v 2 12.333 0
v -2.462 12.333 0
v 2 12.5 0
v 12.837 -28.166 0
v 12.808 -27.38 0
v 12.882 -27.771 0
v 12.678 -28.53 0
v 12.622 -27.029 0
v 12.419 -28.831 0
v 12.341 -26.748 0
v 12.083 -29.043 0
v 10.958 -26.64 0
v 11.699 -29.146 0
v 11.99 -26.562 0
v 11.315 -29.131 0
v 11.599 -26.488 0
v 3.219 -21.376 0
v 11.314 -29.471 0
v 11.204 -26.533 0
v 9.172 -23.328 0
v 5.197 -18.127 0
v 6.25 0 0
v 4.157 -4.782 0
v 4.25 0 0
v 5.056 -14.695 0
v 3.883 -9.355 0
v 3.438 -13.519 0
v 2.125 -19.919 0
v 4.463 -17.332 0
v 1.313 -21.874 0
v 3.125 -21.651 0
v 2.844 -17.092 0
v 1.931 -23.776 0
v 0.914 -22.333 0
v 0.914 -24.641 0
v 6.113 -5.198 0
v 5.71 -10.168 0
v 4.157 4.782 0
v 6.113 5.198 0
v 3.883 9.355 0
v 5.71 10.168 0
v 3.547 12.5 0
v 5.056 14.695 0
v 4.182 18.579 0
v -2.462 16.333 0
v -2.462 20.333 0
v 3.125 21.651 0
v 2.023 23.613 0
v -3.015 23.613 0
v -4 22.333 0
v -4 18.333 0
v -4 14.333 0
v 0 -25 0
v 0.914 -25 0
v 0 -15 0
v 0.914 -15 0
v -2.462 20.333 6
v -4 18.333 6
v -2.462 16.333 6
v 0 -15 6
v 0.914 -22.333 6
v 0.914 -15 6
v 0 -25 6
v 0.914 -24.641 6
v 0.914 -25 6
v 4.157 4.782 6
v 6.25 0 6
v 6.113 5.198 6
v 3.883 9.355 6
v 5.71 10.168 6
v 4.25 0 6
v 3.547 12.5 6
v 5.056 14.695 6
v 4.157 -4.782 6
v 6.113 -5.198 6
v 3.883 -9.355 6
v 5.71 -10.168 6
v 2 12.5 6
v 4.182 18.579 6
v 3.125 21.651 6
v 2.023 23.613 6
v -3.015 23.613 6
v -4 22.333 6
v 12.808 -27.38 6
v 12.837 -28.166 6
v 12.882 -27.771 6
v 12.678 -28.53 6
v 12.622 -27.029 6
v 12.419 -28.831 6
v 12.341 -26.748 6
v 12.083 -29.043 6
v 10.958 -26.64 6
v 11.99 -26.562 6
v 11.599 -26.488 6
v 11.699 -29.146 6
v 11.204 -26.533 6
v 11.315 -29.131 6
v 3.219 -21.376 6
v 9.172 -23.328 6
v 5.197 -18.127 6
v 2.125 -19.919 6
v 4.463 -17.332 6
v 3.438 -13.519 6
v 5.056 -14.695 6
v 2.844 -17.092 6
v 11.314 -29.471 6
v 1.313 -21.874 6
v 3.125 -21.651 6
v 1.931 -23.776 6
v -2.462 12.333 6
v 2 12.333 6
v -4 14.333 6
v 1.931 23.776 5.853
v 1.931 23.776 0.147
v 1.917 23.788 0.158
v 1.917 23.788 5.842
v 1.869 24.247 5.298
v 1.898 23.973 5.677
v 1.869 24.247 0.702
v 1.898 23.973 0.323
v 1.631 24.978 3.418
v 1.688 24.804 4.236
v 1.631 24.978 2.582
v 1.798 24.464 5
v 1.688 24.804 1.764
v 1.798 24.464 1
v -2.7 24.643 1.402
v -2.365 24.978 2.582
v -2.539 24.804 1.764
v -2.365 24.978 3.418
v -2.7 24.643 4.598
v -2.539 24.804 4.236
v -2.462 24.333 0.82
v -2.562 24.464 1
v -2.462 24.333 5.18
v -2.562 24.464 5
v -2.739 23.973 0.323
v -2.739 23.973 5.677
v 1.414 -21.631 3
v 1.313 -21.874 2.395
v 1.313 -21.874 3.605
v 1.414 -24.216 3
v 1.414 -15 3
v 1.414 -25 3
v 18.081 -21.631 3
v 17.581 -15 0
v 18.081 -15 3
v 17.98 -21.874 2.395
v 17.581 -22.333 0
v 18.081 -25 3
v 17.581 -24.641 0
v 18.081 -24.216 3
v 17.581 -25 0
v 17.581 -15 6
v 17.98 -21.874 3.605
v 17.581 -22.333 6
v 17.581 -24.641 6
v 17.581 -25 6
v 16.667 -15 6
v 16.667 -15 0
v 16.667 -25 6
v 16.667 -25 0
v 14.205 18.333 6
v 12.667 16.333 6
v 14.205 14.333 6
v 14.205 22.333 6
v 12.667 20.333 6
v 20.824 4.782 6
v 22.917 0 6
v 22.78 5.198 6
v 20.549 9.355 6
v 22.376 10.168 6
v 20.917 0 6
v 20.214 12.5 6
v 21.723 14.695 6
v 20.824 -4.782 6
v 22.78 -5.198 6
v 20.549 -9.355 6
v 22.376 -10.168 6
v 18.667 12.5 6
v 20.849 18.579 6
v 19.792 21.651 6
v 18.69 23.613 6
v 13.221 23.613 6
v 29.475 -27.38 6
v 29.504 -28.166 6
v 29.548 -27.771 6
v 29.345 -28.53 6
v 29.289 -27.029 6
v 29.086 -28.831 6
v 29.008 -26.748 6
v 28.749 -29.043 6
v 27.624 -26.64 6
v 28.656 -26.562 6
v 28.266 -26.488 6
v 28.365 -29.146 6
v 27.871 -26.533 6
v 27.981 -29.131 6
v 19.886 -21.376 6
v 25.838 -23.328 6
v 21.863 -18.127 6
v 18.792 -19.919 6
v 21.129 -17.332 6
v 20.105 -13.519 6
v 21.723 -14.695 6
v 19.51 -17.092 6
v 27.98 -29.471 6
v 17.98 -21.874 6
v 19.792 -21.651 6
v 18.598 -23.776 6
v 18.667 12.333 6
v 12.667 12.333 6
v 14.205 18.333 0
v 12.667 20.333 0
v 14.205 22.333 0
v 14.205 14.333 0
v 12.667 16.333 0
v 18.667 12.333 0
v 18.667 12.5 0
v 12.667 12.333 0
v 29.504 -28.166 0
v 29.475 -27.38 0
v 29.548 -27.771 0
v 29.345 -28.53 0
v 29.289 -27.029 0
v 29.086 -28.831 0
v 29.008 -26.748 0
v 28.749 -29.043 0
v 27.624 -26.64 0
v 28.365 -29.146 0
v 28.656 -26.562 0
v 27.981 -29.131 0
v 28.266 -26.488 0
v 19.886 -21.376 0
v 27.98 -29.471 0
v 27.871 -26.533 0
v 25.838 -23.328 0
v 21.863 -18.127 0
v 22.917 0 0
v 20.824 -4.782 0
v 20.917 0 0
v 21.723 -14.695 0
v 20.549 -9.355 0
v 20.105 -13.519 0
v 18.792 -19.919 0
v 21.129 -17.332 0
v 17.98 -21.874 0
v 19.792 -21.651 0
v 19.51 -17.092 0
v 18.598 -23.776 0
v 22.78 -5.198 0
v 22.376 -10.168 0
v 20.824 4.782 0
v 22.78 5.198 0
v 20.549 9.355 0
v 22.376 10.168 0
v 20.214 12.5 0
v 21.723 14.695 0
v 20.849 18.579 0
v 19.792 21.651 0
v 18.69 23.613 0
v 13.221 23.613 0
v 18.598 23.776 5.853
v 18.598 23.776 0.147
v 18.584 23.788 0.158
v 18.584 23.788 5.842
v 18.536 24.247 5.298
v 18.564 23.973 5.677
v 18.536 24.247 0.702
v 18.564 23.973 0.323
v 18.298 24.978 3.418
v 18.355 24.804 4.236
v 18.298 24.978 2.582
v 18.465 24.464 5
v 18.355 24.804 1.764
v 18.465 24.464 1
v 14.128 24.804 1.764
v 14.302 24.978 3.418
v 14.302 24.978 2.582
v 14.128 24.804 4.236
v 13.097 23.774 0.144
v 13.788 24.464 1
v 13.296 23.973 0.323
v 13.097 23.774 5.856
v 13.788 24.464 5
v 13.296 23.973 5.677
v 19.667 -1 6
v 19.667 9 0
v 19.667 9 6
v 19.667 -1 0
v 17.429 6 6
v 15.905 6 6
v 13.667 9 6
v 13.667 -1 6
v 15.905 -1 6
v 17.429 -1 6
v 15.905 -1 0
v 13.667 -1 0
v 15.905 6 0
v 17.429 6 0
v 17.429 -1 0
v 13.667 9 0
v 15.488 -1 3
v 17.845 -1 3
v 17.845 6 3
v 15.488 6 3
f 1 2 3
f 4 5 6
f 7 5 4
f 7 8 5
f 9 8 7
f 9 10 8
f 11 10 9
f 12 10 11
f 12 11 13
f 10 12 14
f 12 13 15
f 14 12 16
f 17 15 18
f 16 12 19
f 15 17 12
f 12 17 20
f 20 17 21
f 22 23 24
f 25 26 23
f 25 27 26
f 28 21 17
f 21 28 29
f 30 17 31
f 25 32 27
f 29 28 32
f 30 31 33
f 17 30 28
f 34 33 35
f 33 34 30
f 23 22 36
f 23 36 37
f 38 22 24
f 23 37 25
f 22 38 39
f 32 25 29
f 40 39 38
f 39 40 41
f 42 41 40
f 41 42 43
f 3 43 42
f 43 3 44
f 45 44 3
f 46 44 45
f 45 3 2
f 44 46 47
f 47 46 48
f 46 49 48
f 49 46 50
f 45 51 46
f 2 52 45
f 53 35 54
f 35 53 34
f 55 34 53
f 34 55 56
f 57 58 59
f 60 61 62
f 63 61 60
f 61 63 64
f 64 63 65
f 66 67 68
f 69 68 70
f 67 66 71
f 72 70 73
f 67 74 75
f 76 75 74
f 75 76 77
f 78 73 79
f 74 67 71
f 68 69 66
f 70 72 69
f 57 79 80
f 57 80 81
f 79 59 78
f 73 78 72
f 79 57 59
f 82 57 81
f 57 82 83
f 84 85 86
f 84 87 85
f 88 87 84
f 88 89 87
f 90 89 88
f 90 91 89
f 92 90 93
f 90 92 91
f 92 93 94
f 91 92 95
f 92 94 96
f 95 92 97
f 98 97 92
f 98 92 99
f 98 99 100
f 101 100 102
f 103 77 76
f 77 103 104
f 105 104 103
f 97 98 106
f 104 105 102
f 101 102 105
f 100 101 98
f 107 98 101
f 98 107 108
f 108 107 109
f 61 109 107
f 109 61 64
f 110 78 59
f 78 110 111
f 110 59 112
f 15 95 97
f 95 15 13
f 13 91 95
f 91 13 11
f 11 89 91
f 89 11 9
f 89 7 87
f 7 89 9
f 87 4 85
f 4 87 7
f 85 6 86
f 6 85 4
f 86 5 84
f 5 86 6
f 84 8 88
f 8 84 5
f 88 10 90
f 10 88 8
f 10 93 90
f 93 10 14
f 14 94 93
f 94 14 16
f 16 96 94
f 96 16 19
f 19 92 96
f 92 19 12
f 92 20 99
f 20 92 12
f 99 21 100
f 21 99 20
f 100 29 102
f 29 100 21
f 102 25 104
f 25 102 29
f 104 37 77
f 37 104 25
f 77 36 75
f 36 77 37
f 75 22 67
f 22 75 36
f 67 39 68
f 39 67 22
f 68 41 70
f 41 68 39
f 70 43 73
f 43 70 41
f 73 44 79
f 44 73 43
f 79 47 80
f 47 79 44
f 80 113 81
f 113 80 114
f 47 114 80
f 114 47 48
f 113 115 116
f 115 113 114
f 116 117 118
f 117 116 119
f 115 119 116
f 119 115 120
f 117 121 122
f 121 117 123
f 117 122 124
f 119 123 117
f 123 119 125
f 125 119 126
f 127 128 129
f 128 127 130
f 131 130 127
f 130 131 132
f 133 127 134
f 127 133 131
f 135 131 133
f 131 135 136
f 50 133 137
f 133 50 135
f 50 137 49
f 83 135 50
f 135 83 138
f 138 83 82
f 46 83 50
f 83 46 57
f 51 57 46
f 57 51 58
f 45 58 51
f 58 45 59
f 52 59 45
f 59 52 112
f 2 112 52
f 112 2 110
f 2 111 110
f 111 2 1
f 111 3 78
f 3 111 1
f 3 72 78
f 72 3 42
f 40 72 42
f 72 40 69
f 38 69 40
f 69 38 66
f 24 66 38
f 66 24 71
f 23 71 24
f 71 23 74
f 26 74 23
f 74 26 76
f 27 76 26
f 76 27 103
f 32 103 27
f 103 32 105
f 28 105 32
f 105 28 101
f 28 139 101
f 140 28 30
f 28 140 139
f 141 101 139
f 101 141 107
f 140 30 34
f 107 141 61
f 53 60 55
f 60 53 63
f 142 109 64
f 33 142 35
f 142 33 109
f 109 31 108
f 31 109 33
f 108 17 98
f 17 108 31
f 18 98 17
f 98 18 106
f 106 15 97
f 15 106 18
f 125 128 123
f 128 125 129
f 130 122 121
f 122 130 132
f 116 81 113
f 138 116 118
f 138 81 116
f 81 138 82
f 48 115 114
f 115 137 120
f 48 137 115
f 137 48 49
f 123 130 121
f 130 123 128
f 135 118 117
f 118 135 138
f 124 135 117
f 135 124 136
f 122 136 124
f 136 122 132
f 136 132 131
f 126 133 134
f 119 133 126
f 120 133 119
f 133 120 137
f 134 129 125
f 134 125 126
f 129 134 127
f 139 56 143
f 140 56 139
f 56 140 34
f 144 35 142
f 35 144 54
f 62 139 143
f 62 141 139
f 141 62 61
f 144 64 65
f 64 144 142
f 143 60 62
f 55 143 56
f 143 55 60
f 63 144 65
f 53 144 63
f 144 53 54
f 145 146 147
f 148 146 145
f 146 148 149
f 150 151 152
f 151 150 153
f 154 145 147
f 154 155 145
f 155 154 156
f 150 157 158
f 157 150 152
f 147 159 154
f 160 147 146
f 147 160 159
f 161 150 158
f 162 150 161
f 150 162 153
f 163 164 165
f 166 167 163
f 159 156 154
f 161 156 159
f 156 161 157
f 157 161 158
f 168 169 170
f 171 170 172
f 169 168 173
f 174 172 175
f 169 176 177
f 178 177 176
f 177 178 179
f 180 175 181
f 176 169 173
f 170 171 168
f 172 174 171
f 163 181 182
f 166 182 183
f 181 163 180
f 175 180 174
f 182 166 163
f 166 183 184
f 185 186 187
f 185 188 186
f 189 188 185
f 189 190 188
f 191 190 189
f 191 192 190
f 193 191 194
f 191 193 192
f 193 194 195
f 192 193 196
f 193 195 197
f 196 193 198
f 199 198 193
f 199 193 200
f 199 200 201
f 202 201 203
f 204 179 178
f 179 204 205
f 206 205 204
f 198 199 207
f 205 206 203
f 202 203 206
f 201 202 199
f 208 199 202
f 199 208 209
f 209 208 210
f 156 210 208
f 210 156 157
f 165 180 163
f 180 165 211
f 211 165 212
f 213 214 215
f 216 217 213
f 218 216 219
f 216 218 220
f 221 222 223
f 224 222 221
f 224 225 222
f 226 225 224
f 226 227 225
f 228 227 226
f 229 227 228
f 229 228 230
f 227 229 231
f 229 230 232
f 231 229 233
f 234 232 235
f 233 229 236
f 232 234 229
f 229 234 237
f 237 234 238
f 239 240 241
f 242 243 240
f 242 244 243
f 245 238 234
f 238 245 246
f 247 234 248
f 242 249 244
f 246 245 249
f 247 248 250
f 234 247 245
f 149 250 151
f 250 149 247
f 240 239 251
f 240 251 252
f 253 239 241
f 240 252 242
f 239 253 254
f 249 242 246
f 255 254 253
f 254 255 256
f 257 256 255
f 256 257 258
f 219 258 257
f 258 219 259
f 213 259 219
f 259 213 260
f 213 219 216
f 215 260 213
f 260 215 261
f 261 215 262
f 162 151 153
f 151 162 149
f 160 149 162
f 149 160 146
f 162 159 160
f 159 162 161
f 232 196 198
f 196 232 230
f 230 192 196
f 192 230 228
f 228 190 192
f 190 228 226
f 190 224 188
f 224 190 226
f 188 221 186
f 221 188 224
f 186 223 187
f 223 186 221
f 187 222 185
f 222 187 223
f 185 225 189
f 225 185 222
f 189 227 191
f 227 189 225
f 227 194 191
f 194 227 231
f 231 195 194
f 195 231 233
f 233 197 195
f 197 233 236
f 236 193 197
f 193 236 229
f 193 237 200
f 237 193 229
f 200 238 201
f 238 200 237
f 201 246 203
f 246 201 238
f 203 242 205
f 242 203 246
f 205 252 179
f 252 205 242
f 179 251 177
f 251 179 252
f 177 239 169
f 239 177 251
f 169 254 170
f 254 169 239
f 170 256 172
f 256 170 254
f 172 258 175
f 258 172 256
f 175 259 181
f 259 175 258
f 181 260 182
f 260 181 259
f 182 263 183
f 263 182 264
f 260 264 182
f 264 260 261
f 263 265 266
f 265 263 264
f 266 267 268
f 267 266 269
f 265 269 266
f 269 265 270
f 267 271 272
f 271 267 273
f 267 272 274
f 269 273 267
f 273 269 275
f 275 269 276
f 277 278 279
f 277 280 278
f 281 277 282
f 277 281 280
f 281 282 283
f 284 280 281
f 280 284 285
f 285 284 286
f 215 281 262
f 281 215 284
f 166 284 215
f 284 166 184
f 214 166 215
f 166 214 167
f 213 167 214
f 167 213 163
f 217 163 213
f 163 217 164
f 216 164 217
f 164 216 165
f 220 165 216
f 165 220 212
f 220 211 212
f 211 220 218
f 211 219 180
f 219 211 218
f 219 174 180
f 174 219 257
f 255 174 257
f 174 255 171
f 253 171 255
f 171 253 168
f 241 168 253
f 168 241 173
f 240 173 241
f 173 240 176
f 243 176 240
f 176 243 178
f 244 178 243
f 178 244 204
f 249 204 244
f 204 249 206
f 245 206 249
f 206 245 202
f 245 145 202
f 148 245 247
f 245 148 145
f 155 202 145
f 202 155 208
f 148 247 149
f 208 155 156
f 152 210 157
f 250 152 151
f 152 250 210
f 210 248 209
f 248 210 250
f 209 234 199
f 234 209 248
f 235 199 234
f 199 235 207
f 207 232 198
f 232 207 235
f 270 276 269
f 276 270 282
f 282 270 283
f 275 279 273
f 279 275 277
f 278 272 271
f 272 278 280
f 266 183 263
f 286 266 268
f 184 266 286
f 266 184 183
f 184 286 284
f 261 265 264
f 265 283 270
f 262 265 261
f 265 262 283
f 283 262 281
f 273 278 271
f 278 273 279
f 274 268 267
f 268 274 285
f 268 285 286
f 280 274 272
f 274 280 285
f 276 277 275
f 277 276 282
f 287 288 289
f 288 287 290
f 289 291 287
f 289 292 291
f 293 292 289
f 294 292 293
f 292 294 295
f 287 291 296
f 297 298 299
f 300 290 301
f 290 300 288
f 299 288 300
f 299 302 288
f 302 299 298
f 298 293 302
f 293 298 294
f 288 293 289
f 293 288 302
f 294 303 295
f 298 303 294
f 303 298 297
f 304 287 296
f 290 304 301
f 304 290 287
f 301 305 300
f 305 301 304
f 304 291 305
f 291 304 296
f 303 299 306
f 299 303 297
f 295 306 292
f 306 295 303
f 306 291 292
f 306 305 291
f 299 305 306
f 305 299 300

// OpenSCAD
//
//  Copyright (C) 15-05-2013 Jasper den Ouden.
//
//  This is free software: you can redistribute it and/or modify
//  it under the terms of the GNU General Public License as published
//  by the Free Software Foundation, either version 3 of the License, or
//  (at your option) any later version.
//

// Clamp profile and application with 5mm pole system.

$quality=30;//120;
$fs=0.4;

t=4; //Thicknesses.
l= 50; //Length of clamp.
h = 1.5*t;

zl = t; //Single zigzag length.
zw = zl/1.3;

tab=true;
logo=true;

hl = 20; //Handle length.
ha = 45; //.. angle
ht = t;  //.. thickness

module teeth_profile(oz,l=l)
{   difference()
    {   union()
        {   square([1.5*t,l-1.5*t]);
            intersection() 
            {   translate([0,l-1.5*t]) circle(1.5*t);
                square([1.5*t,l]);
            }
        }
        //Zigzag motion.
        for( y = [oz : zl : l] ) 
            translate([0,y]) scale([zw/zl,1]) rotate(45) square([zl,zl]/sqrt(2), center=true);
        //Entry at top.
        translate([0,l]) rotate(45) square(t*[2,2], center=true);
    }
}

module clamp_profile(oz)
{   union()
    {   difference()
        {   union()
            {   scale([1/2,2]/4) circle(l); //Arc.
                if( hl > 0 ) translate([0,-l/4]) rotate(180+ha) union()//Handle
                {   intersection() 
                    {   square([ht,hl]);
                        translate([ht,0]) scale([ht,hl]) circle(1);
                    }
                    translate([2*ht/3,hl-ht/4]) circle(ht/3);
                }
            }
            difference()
            {   scale([1/2-2*t/l,2-2*t/l]/4) circle(l); //Hole and reinforcement.
                translate([5*l,l/2]) square([10*l,l/2],center=true);
            }
            translate([-l,-l]) square([l,2*l]); //Half it.
        }
        //Pad.
        translate([-t,t+l/6]) 
            intersection(){ teeth_profile(oz,l/3); square([l,l/3-t],r=t/3); }
    }
}

peg_connect = false; //Old way of connecting the two parts.
module peg_profile()
{   polygon([[+1,-1],[-1,+1],[+1,+1]]*t/2); }

module half_clamp(oz)
{
    union()
    {   intersection()
        {   linear_extrude(height=h) difference()
            {   clamp_profile(oz);
                if(peg_connect) union()
                {   for( y=[0,1.6*t] ) translate([0,y-l/2+t]) rotate(45) 
                                           square(sqrt(2)*t,r=t/4,center=true);
                    translate([0,-l/2]) square([2*t,2*t],center=true);
                }
            }
            rotate([0,90]) translate([0,0,-l]) linear_extrude(height=3*l) 
                translate([-h/2,l/2-h/1.5]) union()
            {   circle(h/1.5);
                translate([0,-l]) square([2*h/1.5, 2*l],center=true);
             }
        }
        //Old peg system to connect them.(pretty poor, at least at the scale i tried)
        if(peg_connect) for( y = [0,1.6*t] ) translate([0,y-l/2+t]) union()
        {   linear_extrude(height=h/2) 
                rotate(45) difference()
            {   square(sqrt(2)*t,r=t/4,center=true);
                rotate(-90) peg_profile();
            }
            rotate(135) linear_extrude(height=h) peg_profile();
        }
        translate([0,(h+t)/2-l/2,h/2]) intersection() //Thing to hold the backside together.
        {   scale([1/3,1,2]) rotate([0,45]) cube([h,h+t,h], center=true);
            translate([h,0]) cube([2*h,4*h,h], center=true);
        }
    }
}

module wedge()
{
    translate([0,0,h/2]) difference()
    {   translate([0,t]) intersection()
        {   cube([h,h+t,h], center=true);
            cube([h,h+t,h+t/2], center=true, r=t);
        }
        scale([1/3.6,2,2]) rotate([0,45]) cube([h,h,h], center=true);
    }
}

module clamp_pair()
{   union()
    {   half_clamp(0);
        translate([l/3,0]) half_clamp(zl/2);
        translate([l/3,0]) wedge();
    }
}
clamp_pair();
